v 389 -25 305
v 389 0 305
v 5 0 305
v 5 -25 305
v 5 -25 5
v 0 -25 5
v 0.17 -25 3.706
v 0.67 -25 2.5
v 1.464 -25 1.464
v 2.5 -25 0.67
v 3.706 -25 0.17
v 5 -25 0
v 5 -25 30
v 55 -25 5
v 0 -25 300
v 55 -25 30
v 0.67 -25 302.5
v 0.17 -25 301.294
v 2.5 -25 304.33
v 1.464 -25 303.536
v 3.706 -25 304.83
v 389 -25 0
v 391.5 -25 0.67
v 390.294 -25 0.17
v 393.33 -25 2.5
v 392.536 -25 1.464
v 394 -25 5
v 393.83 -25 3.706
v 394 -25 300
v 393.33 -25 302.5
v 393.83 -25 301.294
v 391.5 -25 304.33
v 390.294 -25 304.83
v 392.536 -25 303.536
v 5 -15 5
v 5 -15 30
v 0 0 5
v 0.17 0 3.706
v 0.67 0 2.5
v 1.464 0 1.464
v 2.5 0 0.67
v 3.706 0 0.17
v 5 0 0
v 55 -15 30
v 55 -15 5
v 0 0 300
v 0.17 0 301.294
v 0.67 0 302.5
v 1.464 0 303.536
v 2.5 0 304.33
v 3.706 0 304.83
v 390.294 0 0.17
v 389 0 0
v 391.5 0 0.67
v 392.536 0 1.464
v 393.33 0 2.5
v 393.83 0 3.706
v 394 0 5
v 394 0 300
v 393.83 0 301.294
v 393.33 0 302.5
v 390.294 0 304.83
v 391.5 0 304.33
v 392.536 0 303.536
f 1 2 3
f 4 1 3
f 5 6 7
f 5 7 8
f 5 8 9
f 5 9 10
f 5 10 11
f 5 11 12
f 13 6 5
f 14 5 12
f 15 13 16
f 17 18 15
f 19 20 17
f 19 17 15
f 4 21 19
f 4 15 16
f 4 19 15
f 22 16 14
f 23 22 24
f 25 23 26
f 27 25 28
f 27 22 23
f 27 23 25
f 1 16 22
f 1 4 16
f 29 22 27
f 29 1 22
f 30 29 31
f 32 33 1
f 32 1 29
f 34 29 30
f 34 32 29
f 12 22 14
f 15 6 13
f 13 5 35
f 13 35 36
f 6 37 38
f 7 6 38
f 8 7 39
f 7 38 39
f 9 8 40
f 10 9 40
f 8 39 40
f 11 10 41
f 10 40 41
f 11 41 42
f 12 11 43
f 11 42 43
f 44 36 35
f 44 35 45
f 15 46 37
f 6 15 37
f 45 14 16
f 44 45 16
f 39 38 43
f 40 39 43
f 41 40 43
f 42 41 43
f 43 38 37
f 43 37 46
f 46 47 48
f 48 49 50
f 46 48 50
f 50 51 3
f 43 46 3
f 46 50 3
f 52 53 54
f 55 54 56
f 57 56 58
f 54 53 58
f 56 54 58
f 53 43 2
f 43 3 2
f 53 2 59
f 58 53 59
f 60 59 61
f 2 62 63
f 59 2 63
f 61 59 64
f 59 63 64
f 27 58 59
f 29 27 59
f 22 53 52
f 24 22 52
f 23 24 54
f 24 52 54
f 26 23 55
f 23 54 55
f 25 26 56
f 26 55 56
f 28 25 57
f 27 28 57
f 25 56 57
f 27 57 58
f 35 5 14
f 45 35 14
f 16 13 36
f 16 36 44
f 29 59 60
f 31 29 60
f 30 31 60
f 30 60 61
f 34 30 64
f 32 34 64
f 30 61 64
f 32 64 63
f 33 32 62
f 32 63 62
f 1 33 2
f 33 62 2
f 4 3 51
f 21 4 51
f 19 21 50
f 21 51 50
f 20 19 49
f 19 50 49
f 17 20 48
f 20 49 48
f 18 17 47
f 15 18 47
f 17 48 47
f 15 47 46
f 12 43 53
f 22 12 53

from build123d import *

# Parameters (mm, degrees)
F1_DEPTH = 25
F2_W     = 50
F2_H     = 25
F3_DEPTH = 10


with BuildPart() as f1:
    # F0 (on Front) → F1 (new body)
    with BuildSketch(Plane.XZ):
        with BuildLine():
            ThreePointArc((0, 5), (1.464466, 1.464466), (5, 0))
            Line((5, 0), (389, 0))
            ThreePointArc((389, 0), (392.535534, 1.464466), (394, 5))
            Line((394, 5), (394, 300))
            ThreePointArc((394, 300), (392.535534, 303.535534), (389, 305))
            Line((389, 305), (5, 305))
            ThreePointArc((5, 305), (1.464466, 303.535534), (0, 300))
            Line((0, 300), (0, 5))
        make_face()
    extrude(amount=F1_DEPTH)

    # F2 (on face) → F3 (cut)
    with BuildSketch(Plane.XZ.offset(25)):
        with Locations((30, 17.5)):
            Rectangle(F2_W, F2_H)
    extrude(amount=-F3_DEPTH, mode=Mode.SUBTRACT)


solid = f1.part
